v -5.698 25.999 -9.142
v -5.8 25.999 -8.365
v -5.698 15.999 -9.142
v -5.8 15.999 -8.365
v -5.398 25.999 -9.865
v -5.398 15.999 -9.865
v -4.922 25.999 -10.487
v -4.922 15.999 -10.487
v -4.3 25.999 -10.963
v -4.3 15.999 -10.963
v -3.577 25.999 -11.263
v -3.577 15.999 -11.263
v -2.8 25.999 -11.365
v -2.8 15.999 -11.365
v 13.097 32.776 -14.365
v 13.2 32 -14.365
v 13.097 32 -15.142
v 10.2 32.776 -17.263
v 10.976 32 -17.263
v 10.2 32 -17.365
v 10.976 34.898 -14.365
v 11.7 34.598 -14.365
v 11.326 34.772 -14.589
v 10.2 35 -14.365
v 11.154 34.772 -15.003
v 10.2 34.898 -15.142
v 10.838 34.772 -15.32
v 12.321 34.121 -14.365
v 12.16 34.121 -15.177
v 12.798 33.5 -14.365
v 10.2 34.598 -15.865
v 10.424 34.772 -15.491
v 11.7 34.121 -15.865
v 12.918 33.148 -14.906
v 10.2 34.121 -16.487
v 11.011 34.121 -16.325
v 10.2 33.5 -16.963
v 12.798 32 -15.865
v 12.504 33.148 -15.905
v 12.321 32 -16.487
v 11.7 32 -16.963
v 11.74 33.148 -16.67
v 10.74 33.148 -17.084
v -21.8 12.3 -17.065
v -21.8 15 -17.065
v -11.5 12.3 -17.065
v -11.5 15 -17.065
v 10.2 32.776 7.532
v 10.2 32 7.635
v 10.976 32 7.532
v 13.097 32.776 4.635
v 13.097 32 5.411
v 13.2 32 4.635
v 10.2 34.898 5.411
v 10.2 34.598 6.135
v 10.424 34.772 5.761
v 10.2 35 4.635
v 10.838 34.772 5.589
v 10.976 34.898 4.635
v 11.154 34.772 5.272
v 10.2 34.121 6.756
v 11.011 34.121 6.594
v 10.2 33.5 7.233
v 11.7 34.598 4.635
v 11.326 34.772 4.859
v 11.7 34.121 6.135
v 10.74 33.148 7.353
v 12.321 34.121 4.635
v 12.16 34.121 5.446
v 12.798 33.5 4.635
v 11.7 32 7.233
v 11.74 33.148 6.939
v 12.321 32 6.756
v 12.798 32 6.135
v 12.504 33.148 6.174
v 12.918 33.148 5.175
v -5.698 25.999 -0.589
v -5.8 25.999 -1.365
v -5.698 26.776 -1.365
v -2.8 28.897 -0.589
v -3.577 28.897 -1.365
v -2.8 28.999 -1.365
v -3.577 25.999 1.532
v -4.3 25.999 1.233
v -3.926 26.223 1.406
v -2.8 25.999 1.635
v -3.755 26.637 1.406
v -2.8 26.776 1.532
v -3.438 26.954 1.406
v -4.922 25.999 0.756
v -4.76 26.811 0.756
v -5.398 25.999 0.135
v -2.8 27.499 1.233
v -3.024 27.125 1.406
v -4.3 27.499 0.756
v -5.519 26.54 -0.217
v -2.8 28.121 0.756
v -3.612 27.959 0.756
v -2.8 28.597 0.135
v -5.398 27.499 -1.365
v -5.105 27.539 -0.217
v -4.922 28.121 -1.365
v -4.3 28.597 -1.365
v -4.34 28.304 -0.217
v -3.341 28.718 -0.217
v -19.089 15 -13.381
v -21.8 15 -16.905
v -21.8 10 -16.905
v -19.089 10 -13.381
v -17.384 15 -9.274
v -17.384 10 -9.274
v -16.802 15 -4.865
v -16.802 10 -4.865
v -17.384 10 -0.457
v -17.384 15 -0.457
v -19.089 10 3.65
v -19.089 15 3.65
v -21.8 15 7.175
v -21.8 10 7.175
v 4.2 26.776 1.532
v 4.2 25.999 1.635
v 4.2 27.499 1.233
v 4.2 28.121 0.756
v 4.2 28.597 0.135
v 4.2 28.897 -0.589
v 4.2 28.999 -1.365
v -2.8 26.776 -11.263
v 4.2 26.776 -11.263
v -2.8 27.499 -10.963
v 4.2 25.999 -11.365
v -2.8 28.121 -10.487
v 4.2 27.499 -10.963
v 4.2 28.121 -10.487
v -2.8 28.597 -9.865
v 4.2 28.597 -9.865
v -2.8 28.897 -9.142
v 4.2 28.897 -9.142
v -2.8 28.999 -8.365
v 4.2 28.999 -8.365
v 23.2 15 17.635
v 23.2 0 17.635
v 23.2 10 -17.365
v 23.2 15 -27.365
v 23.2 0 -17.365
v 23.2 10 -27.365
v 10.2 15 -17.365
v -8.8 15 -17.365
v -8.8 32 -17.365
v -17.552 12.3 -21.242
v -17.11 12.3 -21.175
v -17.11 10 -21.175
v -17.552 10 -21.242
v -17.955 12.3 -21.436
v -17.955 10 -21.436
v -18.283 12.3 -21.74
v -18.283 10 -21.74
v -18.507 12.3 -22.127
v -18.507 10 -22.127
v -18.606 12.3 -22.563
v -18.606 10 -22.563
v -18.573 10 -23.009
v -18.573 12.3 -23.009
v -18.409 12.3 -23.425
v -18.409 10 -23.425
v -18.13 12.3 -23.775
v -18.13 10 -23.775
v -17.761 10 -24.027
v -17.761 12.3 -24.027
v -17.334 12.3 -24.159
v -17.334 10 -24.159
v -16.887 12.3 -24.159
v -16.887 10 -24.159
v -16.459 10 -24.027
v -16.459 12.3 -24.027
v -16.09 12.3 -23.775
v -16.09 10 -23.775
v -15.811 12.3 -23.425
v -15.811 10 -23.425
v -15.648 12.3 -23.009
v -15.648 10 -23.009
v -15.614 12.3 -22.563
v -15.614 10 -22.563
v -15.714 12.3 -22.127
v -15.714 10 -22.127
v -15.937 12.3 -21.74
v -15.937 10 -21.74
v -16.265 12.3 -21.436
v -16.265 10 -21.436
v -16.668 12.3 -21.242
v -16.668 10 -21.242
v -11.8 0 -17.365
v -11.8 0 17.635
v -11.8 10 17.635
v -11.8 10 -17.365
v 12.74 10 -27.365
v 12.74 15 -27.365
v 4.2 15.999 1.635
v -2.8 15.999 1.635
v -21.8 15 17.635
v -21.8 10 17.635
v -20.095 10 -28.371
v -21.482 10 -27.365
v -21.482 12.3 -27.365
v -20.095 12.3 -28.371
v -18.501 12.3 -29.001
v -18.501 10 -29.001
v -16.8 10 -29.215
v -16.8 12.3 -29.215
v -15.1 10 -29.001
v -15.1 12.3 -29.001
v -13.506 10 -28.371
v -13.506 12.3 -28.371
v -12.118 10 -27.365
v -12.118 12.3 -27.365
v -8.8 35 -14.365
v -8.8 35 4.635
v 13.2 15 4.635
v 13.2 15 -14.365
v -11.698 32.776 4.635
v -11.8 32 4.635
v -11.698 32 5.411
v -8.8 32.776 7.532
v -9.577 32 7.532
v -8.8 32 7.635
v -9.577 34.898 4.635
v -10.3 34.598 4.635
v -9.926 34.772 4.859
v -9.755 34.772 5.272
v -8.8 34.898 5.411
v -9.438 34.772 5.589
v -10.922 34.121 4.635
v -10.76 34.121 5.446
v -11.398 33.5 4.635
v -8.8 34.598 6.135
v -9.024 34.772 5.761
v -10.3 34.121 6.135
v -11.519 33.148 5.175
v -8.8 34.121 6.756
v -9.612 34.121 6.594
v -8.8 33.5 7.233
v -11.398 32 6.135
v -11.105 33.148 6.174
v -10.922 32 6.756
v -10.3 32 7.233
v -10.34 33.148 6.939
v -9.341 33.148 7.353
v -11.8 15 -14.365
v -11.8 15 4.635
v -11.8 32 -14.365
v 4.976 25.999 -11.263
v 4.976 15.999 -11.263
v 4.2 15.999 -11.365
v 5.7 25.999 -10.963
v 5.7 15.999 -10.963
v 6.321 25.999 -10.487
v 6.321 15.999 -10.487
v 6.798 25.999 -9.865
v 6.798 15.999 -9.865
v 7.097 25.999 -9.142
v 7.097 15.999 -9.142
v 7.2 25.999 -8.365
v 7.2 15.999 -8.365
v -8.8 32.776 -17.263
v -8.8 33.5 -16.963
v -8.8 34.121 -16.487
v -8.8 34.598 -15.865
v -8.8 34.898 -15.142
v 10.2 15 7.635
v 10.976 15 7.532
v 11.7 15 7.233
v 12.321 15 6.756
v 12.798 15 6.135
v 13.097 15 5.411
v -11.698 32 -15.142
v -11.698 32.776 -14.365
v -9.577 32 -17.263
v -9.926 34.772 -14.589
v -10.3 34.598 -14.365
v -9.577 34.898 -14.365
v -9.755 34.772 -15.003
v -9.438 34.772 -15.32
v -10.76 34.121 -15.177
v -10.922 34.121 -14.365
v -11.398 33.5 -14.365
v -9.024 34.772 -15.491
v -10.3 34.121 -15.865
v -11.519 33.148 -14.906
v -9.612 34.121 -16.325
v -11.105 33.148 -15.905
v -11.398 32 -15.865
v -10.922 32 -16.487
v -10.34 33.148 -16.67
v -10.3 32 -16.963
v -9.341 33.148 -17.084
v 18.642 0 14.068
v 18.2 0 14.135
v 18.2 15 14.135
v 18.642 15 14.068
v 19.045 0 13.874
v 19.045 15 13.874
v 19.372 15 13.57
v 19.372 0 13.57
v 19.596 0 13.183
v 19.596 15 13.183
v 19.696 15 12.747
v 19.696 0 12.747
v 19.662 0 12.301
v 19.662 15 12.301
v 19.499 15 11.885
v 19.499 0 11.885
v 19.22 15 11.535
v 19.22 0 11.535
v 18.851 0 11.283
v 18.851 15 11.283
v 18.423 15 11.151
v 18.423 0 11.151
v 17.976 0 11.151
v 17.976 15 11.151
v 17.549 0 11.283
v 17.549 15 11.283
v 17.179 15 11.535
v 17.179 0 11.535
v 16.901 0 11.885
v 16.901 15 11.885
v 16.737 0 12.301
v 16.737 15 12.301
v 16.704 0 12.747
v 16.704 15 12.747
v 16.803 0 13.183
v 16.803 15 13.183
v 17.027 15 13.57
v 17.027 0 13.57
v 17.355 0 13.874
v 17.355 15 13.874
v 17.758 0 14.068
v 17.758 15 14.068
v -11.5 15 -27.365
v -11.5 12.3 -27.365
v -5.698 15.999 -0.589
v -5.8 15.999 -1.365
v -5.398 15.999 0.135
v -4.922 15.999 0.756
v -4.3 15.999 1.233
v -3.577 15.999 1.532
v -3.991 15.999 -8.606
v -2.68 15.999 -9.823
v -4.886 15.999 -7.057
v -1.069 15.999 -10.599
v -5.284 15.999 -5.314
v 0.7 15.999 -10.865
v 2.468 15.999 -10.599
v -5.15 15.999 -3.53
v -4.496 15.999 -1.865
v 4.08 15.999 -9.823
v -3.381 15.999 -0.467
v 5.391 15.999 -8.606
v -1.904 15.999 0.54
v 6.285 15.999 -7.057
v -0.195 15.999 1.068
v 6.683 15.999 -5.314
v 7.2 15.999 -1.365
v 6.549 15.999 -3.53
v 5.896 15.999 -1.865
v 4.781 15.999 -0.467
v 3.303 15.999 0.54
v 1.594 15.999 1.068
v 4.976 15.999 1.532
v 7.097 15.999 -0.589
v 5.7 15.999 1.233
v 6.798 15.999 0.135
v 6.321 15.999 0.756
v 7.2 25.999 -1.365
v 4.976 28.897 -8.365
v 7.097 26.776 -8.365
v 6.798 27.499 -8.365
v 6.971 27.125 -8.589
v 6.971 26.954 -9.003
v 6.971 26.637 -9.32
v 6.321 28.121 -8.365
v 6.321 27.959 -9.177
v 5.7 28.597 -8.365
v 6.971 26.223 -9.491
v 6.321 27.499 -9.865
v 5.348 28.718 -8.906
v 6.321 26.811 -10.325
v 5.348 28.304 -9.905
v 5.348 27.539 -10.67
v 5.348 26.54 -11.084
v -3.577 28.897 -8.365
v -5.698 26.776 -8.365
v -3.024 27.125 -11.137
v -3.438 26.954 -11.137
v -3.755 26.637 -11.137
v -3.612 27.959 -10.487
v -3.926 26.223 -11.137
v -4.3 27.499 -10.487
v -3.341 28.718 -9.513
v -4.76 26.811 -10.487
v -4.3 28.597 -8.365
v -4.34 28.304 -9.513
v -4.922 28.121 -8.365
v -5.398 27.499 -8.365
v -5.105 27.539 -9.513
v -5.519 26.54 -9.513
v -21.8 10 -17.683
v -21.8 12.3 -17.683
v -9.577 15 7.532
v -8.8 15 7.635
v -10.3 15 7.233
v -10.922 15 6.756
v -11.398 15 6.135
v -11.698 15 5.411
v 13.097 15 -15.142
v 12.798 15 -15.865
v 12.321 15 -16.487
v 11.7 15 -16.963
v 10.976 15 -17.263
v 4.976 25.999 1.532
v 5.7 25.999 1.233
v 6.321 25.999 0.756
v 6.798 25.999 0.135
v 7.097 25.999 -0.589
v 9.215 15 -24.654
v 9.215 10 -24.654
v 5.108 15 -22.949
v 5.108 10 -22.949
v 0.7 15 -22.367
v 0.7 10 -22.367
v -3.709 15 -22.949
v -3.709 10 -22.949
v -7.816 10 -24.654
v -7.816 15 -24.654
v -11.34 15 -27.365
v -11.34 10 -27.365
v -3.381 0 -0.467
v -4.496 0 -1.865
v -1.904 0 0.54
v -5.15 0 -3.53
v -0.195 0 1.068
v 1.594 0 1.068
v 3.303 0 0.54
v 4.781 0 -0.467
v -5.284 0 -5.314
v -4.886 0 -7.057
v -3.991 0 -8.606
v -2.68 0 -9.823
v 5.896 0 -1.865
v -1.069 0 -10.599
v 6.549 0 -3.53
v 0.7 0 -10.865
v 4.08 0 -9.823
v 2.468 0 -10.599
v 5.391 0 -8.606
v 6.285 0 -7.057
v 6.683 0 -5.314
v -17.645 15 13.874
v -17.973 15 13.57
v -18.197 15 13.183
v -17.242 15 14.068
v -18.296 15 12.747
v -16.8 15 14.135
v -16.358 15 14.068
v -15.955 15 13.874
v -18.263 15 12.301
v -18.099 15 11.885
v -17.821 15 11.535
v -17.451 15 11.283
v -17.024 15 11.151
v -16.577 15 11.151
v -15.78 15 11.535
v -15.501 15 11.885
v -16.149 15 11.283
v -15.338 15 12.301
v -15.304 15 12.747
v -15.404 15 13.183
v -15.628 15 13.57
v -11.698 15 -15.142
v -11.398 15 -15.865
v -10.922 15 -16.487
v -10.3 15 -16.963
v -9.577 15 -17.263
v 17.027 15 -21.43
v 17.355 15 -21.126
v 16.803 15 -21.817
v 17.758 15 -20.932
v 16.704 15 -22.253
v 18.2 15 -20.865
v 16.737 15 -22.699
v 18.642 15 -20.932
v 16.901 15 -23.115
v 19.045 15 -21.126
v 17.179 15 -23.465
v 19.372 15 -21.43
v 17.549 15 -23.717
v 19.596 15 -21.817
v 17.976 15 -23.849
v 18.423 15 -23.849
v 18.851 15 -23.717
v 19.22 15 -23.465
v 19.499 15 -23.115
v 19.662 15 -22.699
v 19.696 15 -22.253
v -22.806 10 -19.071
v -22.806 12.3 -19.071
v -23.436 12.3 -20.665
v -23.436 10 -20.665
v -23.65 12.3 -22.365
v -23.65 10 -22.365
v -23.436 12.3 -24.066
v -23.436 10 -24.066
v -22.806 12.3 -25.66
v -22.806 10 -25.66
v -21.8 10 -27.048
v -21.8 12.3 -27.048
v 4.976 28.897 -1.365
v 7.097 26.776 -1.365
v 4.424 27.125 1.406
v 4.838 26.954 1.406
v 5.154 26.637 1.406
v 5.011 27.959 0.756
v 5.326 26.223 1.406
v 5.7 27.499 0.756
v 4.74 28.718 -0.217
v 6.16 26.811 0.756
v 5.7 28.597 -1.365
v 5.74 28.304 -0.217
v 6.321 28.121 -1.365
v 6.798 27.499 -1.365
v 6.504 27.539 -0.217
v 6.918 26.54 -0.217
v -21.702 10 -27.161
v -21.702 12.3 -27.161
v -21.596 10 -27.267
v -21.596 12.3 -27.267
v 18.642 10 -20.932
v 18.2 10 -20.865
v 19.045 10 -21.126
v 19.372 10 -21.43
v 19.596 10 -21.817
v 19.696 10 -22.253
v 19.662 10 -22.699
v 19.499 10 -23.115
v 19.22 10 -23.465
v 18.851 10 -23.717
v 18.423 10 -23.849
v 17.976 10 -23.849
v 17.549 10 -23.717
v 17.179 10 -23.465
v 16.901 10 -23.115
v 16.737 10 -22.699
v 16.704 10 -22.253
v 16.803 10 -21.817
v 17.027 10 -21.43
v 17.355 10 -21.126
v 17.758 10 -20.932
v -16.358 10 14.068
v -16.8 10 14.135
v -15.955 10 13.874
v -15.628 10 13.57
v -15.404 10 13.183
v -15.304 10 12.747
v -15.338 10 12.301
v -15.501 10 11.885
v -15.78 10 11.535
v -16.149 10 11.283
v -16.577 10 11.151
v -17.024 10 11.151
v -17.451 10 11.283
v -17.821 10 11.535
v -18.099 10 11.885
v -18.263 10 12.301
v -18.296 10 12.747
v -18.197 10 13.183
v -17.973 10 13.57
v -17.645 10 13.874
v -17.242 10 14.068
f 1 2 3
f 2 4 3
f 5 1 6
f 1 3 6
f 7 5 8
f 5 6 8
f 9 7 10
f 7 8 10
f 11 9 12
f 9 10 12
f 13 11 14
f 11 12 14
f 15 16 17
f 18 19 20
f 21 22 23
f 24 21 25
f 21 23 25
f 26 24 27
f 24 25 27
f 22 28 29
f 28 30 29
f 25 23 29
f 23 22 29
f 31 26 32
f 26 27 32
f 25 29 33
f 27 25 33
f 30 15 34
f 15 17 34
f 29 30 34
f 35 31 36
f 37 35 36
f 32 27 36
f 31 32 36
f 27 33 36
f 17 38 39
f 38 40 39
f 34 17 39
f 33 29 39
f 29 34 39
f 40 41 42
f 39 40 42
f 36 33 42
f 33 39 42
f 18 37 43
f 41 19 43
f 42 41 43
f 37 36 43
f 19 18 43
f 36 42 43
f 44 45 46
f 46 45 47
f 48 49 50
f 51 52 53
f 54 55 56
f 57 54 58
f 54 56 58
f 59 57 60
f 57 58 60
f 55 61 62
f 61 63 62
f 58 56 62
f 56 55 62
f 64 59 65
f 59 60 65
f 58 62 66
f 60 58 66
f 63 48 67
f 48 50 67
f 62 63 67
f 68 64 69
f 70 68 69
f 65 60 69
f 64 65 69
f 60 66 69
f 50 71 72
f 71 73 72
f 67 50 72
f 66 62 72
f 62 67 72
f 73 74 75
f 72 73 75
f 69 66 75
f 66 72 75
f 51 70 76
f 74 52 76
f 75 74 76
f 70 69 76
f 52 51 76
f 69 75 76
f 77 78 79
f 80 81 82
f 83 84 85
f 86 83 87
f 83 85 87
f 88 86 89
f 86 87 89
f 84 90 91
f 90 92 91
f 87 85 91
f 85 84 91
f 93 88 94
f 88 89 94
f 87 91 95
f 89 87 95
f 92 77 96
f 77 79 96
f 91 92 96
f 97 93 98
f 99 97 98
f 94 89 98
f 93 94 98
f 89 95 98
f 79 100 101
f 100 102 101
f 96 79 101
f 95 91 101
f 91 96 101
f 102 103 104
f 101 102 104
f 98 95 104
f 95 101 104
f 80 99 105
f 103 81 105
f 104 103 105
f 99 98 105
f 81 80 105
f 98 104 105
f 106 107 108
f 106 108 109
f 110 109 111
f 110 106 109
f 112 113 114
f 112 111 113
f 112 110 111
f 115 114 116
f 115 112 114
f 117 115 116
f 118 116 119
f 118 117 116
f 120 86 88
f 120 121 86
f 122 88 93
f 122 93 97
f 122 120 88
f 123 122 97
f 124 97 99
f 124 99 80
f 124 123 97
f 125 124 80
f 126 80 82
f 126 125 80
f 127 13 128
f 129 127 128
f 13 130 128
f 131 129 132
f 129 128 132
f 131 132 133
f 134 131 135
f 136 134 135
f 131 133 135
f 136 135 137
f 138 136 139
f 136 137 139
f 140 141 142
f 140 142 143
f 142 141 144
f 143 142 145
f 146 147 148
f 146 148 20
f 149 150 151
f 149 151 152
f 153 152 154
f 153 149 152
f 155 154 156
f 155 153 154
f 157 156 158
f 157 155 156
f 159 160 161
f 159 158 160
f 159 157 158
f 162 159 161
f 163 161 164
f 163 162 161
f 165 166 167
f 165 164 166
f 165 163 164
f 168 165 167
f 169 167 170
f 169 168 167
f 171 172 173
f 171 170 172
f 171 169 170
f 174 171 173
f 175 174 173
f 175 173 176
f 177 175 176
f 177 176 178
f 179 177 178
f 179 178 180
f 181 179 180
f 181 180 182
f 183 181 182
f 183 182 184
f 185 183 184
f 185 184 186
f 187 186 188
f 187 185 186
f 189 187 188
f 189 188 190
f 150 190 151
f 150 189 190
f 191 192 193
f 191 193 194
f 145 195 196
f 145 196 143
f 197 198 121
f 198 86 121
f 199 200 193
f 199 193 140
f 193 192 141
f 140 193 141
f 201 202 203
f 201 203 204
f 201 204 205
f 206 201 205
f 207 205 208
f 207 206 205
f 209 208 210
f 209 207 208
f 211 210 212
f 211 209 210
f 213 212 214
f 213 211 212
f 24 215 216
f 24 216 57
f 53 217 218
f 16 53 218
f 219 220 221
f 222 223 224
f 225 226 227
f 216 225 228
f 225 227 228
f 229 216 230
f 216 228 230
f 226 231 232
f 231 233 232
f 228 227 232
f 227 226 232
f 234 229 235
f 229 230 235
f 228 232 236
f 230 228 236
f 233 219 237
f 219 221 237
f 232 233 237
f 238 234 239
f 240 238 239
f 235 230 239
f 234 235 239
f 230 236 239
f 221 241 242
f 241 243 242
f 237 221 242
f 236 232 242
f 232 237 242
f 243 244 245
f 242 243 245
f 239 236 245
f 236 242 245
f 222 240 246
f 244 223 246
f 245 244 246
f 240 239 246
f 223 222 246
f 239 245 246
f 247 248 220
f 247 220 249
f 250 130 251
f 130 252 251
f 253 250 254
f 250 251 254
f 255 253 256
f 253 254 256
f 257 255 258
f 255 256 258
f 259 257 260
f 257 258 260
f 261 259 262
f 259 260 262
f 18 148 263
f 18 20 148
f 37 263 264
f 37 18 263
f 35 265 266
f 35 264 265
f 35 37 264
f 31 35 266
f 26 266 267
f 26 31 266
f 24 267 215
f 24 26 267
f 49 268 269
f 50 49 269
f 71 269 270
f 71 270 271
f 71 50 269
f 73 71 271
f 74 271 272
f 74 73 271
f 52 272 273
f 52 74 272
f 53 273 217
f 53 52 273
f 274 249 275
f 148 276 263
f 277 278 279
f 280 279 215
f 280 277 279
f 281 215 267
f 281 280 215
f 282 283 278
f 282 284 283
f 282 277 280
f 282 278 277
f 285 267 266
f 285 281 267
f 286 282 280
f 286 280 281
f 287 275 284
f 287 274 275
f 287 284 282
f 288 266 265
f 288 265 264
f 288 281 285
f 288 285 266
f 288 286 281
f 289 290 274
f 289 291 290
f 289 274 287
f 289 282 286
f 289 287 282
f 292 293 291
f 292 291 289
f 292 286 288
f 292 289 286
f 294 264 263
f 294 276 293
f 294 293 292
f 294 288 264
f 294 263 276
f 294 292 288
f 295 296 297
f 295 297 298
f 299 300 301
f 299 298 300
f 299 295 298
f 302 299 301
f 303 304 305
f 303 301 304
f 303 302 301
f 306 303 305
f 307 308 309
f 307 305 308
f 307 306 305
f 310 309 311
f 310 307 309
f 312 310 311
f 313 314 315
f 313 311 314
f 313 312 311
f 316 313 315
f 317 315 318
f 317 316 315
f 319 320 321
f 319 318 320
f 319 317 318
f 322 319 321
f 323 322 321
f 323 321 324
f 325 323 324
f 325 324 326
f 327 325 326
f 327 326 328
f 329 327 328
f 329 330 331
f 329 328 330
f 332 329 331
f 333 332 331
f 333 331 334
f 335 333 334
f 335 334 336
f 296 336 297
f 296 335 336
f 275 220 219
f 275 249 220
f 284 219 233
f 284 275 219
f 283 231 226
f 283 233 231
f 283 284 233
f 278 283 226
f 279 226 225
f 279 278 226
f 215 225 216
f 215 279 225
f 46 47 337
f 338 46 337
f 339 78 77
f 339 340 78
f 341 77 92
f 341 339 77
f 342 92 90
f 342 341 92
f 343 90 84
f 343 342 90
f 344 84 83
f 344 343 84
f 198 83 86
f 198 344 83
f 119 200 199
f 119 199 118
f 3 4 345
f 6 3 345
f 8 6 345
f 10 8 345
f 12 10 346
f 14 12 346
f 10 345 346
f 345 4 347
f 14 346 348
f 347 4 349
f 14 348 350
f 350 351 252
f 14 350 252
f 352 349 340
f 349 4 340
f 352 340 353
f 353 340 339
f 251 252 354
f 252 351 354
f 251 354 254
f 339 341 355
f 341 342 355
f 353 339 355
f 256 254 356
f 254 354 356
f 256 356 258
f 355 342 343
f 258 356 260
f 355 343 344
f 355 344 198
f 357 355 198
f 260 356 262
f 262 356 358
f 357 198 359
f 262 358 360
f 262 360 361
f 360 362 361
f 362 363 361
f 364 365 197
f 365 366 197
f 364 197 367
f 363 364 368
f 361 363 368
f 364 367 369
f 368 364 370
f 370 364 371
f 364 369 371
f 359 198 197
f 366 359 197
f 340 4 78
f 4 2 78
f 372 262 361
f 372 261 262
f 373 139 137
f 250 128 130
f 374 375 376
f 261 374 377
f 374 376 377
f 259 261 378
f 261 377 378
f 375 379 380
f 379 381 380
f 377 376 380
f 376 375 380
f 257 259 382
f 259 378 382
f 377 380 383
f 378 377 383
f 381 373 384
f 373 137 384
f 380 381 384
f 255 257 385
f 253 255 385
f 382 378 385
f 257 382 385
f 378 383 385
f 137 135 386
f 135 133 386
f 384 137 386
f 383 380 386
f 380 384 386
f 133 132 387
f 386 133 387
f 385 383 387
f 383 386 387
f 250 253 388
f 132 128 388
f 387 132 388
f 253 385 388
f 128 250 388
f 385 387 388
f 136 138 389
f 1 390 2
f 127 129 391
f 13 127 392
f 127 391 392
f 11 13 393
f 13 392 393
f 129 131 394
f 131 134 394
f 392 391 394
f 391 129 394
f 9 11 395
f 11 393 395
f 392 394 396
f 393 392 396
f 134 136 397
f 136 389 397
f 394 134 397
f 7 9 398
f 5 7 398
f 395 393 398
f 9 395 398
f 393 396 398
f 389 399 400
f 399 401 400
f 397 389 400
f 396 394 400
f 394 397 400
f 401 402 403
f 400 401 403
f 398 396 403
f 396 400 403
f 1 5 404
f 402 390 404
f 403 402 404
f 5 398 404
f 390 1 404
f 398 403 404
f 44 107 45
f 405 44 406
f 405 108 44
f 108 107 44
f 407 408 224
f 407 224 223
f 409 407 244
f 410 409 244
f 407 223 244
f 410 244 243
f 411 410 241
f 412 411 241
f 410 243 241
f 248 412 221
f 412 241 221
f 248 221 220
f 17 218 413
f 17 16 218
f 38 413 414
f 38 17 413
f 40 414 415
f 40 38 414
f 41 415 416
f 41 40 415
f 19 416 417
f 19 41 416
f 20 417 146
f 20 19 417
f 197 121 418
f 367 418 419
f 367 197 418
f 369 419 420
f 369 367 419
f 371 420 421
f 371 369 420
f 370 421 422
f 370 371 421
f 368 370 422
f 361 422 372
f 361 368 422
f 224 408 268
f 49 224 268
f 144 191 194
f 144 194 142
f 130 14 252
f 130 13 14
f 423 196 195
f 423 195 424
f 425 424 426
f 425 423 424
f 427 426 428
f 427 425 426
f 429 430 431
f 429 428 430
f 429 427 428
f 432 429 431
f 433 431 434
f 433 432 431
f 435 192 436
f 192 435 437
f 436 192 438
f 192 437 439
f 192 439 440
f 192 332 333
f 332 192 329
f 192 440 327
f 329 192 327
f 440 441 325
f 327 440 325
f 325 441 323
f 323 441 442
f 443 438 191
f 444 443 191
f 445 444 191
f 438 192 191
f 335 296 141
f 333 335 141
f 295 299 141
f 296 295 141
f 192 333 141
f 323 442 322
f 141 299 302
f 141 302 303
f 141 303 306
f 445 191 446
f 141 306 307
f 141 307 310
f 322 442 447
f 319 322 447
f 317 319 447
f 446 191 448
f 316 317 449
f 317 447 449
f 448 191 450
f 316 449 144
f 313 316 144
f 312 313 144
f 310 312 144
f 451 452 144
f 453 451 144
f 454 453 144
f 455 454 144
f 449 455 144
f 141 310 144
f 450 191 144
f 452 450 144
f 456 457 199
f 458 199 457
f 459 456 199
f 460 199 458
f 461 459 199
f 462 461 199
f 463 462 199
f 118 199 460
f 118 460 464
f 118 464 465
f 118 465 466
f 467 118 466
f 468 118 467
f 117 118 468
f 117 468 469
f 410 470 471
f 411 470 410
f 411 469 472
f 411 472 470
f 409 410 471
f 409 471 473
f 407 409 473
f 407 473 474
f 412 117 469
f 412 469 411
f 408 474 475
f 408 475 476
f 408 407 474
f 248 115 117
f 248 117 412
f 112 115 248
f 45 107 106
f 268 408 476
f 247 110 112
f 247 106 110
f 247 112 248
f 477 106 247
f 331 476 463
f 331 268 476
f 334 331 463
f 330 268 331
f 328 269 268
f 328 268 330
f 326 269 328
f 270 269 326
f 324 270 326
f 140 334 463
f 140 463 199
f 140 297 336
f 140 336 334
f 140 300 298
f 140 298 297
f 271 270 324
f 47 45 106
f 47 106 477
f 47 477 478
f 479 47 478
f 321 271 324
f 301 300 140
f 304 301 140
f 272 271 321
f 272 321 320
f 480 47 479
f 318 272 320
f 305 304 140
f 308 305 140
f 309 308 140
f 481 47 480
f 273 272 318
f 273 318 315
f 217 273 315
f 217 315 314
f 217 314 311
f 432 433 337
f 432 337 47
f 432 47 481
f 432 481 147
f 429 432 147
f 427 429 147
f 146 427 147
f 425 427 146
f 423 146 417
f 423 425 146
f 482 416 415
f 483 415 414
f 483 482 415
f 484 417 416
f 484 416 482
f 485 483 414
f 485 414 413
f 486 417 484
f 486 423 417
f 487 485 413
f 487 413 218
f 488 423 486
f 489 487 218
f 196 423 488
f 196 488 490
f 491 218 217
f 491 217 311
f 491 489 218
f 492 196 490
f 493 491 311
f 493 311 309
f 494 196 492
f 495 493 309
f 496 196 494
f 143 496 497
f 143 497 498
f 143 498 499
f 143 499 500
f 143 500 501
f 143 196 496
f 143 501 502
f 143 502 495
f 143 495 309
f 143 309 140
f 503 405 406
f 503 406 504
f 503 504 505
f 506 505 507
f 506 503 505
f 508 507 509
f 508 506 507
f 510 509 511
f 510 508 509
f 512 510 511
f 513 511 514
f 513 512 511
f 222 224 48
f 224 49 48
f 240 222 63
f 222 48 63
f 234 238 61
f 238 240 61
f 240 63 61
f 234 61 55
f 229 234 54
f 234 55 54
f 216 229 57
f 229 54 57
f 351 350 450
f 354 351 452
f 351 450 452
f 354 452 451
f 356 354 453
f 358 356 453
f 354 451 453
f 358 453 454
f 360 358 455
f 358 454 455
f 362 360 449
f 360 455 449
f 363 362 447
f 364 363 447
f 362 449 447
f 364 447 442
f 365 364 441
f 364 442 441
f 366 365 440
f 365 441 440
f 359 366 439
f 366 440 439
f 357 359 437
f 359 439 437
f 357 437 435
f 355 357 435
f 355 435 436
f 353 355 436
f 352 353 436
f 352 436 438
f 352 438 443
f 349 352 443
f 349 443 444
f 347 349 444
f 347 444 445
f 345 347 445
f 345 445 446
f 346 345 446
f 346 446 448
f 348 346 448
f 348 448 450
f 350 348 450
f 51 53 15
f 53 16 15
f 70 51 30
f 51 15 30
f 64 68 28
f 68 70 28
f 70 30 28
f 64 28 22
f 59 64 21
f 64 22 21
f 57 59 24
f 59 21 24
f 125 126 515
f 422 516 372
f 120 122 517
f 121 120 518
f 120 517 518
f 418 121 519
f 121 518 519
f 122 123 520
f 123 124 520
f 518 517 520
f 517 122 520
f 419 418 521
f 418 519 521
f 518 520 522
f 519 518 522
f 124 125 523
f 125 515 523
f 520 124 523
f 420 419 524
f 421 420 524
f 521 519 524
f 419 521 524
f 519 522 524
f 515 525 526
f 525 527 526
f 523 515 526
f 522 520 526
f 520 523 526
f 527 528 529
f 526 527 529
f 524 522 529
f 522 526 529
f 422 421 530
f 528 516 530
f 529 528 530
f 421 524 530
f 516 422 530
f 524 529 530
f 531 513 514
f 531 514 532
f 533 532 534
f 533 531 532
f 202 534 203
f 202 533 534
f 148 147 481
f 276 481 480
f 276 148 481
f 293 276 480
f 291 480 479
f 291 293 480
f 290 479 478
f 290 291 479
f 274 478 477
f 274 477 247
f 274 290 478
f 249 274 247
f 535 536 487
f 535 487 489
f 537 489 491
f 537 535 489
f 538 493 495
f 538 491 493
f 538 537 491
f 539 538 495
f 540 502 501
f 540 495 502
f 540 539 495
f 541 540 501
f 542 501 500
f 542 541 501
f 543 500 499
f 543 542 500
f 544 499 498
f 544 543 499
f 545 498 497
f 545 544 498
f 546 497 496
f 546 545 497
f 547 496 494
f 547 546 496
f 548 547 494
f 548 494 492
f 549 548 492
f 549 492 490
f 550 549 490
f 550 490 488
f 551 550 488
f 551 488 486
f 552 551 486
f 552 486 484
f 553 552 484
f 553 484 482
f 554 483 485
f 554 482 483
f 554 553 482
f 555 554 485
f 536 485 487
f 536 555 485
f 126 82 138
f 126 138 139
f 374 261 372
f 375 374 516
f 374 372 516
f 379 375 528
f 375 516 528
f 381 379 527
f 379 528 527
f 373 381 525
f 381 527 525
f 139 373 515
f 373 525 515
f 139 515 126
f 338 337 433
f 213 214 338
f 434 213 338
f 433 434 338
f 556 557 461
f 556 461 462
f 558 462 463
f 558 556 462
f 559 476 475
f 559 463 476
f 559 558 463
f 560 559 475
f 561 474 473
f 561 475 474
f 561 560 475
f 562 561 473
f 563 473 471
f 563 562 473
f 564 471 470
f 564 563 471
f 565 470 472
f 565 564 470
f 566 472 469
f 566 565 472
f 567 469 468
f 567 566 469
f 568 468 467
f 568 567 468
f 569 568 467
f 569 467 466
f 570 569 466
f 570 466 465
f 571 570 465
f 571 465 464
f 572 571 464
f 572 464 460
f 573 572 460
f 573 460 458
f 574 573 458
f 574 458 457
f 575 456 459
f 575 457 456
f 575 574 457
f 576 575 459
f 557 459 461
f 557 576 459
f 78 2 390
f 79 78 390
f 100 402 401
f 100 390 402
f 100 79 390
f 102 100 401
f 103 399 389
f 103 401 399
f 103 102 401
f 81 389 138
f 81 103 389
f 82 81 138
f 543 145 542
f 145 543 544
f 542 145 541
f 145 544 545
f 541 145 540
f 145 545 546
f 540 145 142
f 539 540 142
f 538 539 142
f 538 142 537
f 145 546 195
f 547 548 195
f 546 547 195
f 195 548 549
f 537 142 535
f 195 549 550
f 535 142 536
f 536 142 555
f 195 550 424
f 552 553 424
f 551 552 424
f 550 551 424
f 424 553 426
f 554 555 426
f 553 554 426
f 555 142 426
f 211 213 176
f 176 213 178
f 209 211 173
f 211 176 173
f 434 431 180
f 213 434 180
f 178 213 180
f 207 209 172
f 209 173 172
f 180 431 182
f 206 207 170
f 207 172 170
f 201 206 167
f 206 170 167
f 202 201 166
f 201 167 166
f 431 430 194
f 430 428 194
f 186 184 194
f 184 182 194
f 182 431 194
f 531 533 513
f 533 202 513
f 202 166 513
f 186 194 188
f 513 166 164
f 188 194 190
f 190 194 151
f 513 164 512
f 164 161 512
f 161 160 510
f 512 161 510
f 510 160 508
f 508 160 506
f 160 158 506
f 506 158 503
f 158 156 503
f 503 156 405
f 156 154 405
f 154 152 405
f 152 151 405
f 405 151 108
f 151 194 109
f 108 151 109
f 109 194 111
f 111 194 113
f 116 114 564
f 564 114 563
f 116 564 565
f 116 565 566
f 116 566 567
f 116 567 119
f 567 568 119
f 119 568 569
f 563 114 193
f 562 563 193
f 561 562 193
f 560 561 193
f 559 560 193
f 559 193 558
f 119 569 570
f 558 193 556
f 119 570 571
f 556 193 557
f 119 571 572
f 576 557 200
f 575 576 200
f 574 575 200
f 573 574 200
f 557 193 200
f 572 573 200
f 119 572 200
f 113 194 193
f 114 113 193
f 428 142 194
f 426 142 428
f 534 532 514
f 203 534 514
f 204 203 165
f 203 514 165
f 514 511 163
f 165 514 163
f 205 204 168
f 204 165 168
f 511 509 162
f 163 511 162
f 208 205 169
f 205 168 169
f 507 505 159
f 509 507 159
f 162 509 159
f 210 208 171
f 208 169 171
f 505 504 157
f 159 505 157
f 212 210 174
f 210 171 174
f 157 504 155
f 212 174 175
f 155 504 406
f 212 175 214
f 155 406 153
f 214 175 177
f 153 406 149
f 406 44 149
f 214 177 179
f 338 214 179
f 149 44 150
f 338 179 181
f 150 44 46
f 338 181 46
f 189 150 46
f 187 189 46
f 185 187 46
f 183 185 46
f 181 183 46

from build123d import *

# Parameters (mm, degrees)
SKETCH1_W               = 45
SKETCH1_H               = 45
BOSS_EXTRUDE1_DEPTH     = 15
CUT_EXTRUDE1_DEPTH      = 10
CUT_EXTRUDE2_DEPTH      = 38.243644172
CUT_EXTRUDE2_DEPTH_BACK = 38.243644172
SKETCH5_W               = 25
SKETCH5_H               = 25
BOSS_EXTRUDE2_DEPTH     = 20
FILLET1_R               = 3
SKETCH6_R               = 6
CUT_EXTRUDE4_DEPTH      = 28.99918
SKETCH7_W               = 13
SKETCH7_H               = 13
CUT_EXTRUDE5_DEPTH      = 13
FILLET2_R               = 3
CUT_EXTRUDE6_DEPTH      = 42.074189356
CUT_EXTRUDE6_DEPTH_BACK = 42.074189356
SKETCH8_R               = 1.5
SKETCH9_W               = 10.3
SKETCH9_H               = 10.3
CUT_EXTRUDE7_DEPTH      = 2.7
SKETCH10_R              = 6.85
BOSS_EXTRUDE3_DEPTH     = 2.3
CUT_EXTRUDE8_DEPTH      = 46.142818825
CUT_EXTRUDE9_DEPTH      = 46.142818825
CUT_EXTRUDE9_DEPTH_BACK = 46.142818825
SKETCH12_R              = 1.5


with BuildPart() as part:
    # Sketch1 → Boss-Extrude1 (new body)
    with BuildSketch(Plane(origin=(0, 0, 0), x_dir=(1, 0, 0), z_dir=(0, 1, 0))):
        with Locations((0.699698795, 4.865361446)):
            Rectangle(SKETCH1_W, SKETCH1_H)
    extrude(amount=BOSS_EXTRUDE1_DEPTH)

    # Sketch2 → Cut-Extrude1 (cut)
    with BuildSketch(Plane.XZ):
        Polygon((-21.800301205, 17.634638554), (-11.800301205, 17.634638554), (-11.800301205, -17.365361446), (23.199698795, -17.365361446), (23.199698795, -27.365361446), (-21.800301205, -27.365361446), align=None)
    extrude(amount=-CUT_EXTRUDE1_DEPTH, mode=Mode.SUBTRACT)

    # Sketch3 → Cut-Extrude2 (cut, two sides: drawn at the far end of the back side and taken through both)
    with BuildSketch(Plane.XZ.offset(-10).offset(-CUT_EXTRUDE2_DEPTH_BACK)):
        with BuildLine():
            Line((-11.340301205, -27.365361446), (12.739698795, -27.365361446))
            ThreePointArc((12.739698795, -27.365361446), (0.699698795, -22.366961339), (-11.340301205, -27.365361446))
        make_face()
        with BuildLine():
            Line((-21.800301205, 7.174638554), (-21.800301205, -16.905361446))
            ThreePointArc((-21.800301205, -16.905361446), (-16.801901098, -4.865361446), (-21.800301205, 7.174638554))
        make_face()
    extrude(amount=CUT_EXTRUDE2_DEPTH + CUT_EXTRUDE2_DEPTH_BACK, mode=Mode.SUBTRACT)

    # Sketch5 → Boss-Extrude2 (add)
    with BuildSketch(Plane(origin=(0, 15, 0), x_dir=(1, 0, 0), z_dir=(0, 1, 0))):
        with Locations((0.699698795, 4.865361446)):
            Rectangle(SKETCH5_W, SKETCH5_H)
    extrude(amount=BOSS_EXTRUDE2_DEPTH)

    # Fillet1
    fillet1_edges = [part.edges().sort_by_distance(p)[0] for p in [
        (-11.800301205, 25, -17.365361446),
        (-11.800301205, 25, 7.634638554),
        (13.199698795, 25, 7.634638554),
        (13.199698795, 25, -17.365361446),
        (-11.800301205, 35, -4.865361446),
        (0.699698795, 35, 7.634638554),
        (13.199698795, 35, -4.865361446),
        (0.699698795, 35, -17.365361446),
    ]]
    fillet(fillet1_edges, radius=FILLET1_R)

    # Sketch6 → Cut-Extrude4 (cut)
    with BuildSketch(Plane(origin=(0, 0, 0), x_dir=(-1, 0, 0), z_dir=(0, -1, 0))):
        with Locations(Location((-0.699698795, 4.865361446, 0), (0, 0, 90))):
            Circle(SKETCH6_R)
    extrude(amount=-CUT_EXTRUDE4_DEPTH, mode=Mode.SUBTRACT)

    # Sketch7 → Cut-Extrude5 (cut)
    with BuildSketch(Plane.XZ.offset(-28.99918)):
        with Locations((0.699698795, -4.865361446)):
            Rectangle(SKETCH7_W, SKETCH7_H)
    extrude(amount=CUT_EXTRUDE5_DEPTH, mode=Mode.SUBTRACT)

    # Fillet2
    fillet2_edges = [part.edges().sort_by_distance(p)[0] for p in [
        (-5.800301205, 28.99918, -4.865361446),
        (-5.800301205, 22.49918, 1.634638554),
        (0.699698795, 28.99918, -11.365361446),
        (-5.800301205, 22.49918, -11.365361446),
        (7.199698795, 28.99918, -4.865361446),
        (7.199698795, 22.49918, -11.365361446),
        (0.699698795, 28.99918, 1.634638554),
        (7.199698795, 22.49918, 1.634638554),
    ]]
    fillet(fillet2_edges, radius=FILLET2_R)

    # Sketch8 → Cut-Extrude6 (cut, two sides: drawn at the far end of the back side and taken through both)
    with BuildSketch(Plane(origin=(0, 15, 0), x_dir=(1, 0, 0), z_dir=(0, 1, 0)).offset(-CUT_EXTRUDE6_DEPTH_BACK)):
        with Locations(Location((-16.800301205, 22.365361446, 0), (0, 0, 270))):
            Circle(SKETCH8_R)
        with Locations(Location((18.199698795, 22.365361446, 0), (0, 0, 270))):
            Circle(SKETCH8_R)
        with Locations(Location((18.199698795, -12.634638554, 0), (0, 0, 270))):
            Circle(SKETCH8_R)
        with Locations(Location((-16.800301205, -12.634638554, 0), (0, 0, 270))):
            Circle(SKETCH8_R)
    extrude(amount=CUT_EXTRUDE6_DEPTH + CUT_EXTRUDE6_DEPTH_BACK, mode=Mode.SUBTRACT)

    # Sketch9 → Cut-Extrude7 (cut)
    with BuildSketch(Plane(origin=(0, 15, 0), x_dir=(1, 0, 0), z_dir=(0, 1, 0))):
        with Locations((-16.650301205, 22.215361446)):
            Rectangle(SKETCH9_W, SKETCH9_H)
    extrude(amount=-CUT_EXTRUDE7_DEPTH, mode=Mode.SUBTRACT)

    # Sketch10 → Boss-Extrude3 (add)
    with BuildSketch(Plane.XZ.offset(-10)):
        with Locations((-16.800301205, -22.365361446)):
            Circle(SKETCH10_R)
    extrude(amount=-BOSS_EXTRUDE3_DEPTH)

    # Sketch11 → Cut-Extrude8 (cut, through all)
    with BuildSketch(Plane.XZ.offset(-10)):
        with BuildLine():
            Line((-21.482448148, -27.365361446), (-21.800301205, -27.365361446))
            Line((-21.800301205, -27.365361446), (-21.800301205, -27.047508389))
            ThreePointArc((-21.800301205, -27.047508389), (-21.650197676, -27.215257917), (-21.482448148, -27.365361446))
        make_face()
    extrude(amount=-CUT_EXTRUDE8_DEPTH, mode=Mode.SUBTRACT)

    # Sketch12 → Cut-Extrude9 (cut, two sides: drawn at the far end of the back side and taken through both)
    with BuildSketch(Plane.XZ.offset(-10).offset(-CUT_EXTRUDE9_DEPTH_BACK)):
        with Locations(Location((-17.110205033, -22.675265274, 0), (0, 0, 90))):
            Circle(SKETCH12_R)
    extrude(amount=CUT_EXTRUDE9_DEPTH + CUT_EXTRUDE9_DEPTH_BACK, mode=Mode.SUBTRACT)


solid = part.part
